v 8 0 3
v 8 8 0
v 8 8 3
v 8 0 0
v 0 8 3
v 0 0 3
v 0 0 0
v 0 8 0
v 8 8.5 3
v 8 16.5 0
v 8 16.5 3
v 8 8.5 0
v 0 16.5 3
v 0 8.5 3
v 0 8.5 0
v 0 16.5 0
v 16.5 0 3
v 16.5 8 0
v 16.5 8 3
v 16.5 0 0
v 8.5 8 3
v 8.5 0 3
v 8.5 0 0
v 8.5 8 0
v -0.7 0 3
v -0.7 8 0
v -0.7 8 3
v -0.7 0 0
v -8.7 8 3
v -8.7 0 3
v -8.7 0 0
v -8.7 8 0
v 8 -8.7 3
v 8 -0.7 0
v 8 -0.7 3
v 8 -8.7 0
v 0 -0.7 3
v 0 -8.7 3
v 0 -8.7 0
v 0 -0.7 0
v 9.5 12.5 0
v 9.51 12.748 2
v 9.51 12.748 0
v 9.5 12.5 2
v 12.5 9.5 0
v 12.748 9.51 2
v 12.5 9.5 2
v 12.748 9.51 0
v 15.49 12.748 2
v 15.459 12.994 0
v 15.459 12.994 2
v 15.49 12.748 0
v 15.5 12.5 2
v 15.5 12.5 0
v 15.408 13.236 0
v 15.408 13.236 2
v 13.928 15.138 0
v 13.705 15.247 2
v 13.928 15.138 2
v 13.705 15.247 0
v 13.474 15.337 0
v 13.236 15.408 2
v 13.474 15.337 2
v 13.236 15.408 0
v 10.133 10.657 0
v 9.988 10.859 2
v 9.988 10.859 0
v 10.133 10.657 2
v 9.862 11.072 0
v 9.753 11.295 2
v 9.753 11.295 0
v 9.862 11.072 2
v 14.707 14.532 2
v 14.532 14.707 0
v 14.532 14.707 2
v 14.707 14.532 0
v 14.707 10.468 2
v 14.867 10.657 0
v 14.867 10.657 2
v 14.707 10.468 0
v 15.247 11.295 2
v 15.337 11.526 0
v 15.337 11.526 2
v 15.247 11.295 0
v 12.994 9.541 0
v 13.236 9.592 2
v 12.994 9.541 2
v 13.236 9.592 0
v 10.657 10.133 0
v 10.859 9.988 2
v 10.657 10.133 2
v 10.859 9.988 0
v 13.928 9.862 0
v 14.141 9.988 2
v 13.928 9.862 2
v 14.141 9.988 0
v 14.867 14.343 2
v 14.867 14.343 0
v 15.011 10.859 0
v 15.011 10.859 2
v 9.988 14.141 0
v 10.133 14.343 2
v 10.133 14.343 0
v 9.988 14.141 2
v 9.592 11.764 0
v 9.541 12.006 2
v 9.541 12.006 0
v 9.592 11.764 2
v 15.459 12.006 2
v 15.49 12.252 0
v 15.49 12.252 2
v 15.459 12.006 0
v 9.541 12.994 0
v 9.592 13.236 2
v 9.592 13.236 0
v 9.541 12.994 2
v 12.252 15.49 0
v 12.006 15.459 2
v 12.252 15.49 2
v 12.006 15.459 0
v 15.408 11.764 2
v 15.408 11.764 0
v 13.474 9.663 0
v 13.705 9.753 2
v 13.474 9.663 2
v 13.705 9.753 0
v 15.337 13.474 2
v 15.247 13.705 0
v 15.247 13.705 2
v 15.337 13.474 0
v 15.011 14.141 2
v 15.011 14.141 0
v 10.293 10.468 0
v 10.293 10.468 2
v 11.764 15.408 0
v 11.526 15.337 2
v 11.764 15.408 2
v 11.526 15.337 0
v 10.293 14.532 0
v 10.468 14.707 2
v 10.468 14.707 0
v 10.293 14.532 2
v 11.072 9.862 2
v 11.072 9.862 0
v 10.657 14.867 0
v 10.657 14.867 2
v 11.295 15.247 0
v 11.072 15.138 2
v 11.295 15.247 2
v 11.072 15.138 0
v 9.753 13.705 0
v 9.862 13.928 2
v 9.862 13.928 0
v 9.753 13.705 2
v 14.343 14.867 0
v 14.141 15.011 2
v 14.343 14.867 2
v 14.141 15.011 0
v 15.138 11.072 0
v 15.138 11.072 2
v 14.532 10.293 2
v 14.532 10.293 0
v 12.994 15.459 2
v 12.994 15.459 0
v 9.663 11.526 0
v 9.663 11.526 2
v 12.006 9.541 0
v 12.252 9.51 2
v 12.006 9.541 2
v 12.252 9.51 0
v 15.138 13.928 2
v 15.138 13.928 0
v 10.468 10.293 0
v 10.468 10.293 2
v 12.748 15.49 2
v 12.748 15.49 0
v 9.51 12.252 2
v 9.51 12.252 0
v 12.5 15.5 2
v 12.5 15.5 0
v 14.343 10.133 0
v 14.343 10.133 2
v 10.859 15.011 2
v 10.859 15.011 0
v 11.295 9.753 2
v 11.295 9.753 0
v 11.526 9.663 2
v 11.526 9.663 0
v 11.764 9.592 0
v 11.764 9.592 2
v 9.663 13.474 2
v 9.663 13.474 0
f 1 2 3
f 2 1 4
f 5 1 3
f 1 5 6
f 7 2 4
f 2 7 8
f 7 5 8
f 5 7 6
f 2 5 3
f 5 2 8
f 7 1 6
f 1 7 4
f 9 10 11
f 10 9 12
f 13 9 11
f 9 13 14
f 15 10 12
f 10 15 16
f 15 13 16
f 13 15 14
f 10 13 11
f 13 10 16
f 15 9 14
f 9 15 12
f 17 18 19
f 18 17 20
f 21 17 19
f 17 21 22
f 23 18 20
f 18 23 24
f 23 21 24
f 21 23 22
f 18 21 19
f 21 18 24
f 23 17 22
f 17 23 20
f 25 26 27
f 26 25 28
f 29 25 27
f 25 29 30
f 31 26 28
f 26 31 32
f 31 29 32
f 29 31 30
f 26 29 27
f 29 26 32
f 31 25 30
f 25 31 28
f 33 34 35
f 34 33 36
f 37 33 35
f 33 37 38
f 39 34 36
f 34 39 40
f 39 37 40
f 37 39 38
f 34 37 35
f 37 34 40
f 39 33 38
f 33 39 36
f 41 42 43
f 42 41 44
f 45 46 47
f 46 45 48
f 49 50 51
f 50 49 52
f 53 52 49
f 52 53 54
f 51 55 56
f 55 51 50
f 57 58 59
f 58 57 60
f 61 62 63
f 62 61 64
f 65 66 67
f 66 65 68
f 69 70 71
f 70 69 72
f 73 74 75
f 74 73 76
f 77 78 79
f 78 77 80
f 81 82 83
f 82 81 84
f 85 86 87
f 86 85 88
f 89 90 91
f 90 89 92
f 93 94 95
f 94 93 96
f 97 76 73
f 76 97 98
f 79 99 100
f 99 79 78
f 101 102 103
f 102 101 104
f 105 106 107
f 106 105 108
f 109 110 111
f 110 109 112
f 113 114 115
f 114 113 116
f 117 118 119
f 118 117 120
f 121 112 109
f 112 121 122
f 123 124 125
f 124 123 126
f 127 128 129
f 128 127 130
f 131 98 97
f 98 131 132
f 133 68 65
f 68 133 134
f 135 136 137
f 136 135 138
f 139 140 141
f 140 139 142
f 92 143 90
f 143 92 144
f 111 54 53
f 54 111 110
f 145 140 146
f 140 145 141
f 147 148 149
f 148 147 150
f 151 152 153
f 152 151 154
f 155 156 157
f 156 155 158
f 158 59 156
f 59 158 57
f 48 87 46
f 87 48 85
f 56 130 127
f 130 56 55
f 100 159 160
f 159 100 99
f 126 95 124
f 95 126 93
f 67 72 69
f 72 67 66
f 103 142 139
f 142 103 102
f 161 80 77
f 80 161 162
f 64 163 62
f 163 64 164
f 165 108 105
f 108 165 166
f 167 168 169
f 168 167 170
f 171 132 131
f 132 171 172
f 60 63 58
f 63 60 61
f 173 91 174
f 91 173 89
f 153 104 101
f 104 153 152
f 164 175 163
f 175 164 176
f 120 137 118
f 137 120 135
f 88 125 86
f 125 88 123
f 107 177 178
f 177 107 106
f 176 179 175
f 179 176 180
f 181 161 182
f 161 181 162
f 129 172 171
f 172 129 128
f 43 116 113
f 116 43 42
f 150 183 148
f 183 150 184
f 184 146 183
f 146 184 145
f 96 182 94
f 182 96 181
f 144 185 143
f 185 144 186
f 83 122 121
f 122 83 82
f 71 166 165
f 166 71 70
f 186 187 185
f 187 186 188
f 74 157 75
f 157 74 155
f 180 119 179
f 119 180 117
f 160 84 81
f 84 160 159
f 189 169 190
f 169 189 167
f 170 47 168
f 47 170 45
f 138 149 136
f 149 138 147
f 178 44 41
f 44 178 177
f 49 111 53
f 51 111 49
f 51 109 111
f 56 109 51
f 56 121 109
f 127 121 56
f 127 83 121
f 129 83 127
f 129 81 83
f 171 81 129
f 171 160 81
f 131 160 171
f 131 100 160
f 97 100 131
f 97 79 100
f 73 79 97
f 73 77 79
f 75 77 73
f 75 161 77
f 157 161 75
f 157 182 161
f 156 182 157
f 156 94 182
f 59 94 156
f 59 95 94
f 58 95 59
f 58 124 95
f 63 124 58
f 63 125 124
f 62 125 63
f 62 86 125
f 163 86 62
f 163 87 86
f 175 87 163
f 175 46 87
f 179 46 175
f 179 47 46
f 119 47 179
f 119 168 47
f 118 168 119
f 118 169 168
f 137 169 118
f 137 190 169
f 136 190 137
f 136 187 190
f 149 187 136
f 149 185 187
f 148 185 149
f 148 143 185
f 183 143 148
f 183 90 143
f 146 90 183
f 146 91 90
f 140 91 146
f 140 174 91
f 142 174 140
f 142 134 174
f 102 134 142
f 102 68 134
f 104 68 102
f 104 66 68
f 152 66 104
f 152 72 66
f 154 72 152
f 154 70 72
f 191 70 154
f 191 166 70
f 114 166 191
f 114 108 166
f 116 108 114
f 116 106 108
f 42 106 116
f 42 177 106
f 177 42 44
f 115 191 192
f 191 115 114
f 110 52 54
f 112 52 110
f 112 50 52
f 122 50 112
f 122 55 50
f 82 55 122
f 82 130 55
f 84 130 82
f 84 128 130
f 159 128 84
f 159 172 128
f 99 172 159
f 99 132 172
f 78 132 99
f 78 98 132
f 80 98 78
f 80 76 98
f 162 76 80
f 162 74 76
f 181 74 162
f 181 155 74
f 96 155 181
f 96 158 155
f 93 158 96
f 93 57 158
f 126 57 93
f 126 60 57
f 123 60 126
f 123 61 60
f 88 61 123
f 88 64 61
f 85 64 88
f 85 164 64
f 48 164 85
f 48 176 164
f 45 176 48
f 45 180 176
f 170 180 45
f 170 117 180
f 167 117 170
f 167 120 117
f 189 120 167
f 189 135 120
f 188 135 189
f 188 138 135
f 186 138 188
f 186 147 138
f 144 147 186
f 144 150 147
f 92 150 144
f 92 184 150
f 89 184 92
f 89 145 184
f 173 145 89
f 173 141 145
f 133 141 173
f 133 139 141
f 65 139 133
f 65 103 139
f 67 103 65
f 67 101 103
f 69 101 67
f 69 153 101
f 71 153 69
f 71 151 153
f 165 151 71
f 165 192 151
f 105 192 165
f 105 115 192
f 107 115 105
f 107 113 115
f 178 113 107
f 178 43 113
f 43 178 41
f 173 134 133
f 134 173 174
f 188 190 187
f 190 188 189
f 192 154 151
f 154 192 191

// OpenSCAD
//-----------Setup-----------//

//The total print height.
cubeHeight =3;

//The side of the squares.
cubeSide =8;

//The tolrance you want to test (distance between cubes).
tolerance =0.7;

//The second tolrance you want to test.
tolerance2 =0.5;

//-------End of setup-------//

//Disable $fn and $fa
$fn=0;
$fa=0.01;

//Use only $fs
//fine
$fs=0.25;

translate = cubeSide + tolerance;
translate2 = cubeSide + tolerance2;

markerTranslate = cubeSide + cubeSide/2 + tolerance2;

cube([cubeSide, cubeSide, cubeHeight]);

	translate([0, translate2, 0])
	{
		cube([cubeSide, cubeSide, cubeHeight]);
	}
	
	translate([translate2, 0, 0])
	{
		cube([cubeSide, cubeSide, cubeHeight]);
	}

	translate([translate*-1, 0, 0])
	{
		cube([cubeSide, cubeSide, cubeHeight]);
	}
	
	translate([0, translate*-1, 0])
	{
		cube([cubeSide, cubeSide, cubeHeight]);
	}

	translate([markerTranslate, markerTranslate, 0])
	{
		cylinder(2, cubeSide/2-1, cubeSide/2-1);
	}

